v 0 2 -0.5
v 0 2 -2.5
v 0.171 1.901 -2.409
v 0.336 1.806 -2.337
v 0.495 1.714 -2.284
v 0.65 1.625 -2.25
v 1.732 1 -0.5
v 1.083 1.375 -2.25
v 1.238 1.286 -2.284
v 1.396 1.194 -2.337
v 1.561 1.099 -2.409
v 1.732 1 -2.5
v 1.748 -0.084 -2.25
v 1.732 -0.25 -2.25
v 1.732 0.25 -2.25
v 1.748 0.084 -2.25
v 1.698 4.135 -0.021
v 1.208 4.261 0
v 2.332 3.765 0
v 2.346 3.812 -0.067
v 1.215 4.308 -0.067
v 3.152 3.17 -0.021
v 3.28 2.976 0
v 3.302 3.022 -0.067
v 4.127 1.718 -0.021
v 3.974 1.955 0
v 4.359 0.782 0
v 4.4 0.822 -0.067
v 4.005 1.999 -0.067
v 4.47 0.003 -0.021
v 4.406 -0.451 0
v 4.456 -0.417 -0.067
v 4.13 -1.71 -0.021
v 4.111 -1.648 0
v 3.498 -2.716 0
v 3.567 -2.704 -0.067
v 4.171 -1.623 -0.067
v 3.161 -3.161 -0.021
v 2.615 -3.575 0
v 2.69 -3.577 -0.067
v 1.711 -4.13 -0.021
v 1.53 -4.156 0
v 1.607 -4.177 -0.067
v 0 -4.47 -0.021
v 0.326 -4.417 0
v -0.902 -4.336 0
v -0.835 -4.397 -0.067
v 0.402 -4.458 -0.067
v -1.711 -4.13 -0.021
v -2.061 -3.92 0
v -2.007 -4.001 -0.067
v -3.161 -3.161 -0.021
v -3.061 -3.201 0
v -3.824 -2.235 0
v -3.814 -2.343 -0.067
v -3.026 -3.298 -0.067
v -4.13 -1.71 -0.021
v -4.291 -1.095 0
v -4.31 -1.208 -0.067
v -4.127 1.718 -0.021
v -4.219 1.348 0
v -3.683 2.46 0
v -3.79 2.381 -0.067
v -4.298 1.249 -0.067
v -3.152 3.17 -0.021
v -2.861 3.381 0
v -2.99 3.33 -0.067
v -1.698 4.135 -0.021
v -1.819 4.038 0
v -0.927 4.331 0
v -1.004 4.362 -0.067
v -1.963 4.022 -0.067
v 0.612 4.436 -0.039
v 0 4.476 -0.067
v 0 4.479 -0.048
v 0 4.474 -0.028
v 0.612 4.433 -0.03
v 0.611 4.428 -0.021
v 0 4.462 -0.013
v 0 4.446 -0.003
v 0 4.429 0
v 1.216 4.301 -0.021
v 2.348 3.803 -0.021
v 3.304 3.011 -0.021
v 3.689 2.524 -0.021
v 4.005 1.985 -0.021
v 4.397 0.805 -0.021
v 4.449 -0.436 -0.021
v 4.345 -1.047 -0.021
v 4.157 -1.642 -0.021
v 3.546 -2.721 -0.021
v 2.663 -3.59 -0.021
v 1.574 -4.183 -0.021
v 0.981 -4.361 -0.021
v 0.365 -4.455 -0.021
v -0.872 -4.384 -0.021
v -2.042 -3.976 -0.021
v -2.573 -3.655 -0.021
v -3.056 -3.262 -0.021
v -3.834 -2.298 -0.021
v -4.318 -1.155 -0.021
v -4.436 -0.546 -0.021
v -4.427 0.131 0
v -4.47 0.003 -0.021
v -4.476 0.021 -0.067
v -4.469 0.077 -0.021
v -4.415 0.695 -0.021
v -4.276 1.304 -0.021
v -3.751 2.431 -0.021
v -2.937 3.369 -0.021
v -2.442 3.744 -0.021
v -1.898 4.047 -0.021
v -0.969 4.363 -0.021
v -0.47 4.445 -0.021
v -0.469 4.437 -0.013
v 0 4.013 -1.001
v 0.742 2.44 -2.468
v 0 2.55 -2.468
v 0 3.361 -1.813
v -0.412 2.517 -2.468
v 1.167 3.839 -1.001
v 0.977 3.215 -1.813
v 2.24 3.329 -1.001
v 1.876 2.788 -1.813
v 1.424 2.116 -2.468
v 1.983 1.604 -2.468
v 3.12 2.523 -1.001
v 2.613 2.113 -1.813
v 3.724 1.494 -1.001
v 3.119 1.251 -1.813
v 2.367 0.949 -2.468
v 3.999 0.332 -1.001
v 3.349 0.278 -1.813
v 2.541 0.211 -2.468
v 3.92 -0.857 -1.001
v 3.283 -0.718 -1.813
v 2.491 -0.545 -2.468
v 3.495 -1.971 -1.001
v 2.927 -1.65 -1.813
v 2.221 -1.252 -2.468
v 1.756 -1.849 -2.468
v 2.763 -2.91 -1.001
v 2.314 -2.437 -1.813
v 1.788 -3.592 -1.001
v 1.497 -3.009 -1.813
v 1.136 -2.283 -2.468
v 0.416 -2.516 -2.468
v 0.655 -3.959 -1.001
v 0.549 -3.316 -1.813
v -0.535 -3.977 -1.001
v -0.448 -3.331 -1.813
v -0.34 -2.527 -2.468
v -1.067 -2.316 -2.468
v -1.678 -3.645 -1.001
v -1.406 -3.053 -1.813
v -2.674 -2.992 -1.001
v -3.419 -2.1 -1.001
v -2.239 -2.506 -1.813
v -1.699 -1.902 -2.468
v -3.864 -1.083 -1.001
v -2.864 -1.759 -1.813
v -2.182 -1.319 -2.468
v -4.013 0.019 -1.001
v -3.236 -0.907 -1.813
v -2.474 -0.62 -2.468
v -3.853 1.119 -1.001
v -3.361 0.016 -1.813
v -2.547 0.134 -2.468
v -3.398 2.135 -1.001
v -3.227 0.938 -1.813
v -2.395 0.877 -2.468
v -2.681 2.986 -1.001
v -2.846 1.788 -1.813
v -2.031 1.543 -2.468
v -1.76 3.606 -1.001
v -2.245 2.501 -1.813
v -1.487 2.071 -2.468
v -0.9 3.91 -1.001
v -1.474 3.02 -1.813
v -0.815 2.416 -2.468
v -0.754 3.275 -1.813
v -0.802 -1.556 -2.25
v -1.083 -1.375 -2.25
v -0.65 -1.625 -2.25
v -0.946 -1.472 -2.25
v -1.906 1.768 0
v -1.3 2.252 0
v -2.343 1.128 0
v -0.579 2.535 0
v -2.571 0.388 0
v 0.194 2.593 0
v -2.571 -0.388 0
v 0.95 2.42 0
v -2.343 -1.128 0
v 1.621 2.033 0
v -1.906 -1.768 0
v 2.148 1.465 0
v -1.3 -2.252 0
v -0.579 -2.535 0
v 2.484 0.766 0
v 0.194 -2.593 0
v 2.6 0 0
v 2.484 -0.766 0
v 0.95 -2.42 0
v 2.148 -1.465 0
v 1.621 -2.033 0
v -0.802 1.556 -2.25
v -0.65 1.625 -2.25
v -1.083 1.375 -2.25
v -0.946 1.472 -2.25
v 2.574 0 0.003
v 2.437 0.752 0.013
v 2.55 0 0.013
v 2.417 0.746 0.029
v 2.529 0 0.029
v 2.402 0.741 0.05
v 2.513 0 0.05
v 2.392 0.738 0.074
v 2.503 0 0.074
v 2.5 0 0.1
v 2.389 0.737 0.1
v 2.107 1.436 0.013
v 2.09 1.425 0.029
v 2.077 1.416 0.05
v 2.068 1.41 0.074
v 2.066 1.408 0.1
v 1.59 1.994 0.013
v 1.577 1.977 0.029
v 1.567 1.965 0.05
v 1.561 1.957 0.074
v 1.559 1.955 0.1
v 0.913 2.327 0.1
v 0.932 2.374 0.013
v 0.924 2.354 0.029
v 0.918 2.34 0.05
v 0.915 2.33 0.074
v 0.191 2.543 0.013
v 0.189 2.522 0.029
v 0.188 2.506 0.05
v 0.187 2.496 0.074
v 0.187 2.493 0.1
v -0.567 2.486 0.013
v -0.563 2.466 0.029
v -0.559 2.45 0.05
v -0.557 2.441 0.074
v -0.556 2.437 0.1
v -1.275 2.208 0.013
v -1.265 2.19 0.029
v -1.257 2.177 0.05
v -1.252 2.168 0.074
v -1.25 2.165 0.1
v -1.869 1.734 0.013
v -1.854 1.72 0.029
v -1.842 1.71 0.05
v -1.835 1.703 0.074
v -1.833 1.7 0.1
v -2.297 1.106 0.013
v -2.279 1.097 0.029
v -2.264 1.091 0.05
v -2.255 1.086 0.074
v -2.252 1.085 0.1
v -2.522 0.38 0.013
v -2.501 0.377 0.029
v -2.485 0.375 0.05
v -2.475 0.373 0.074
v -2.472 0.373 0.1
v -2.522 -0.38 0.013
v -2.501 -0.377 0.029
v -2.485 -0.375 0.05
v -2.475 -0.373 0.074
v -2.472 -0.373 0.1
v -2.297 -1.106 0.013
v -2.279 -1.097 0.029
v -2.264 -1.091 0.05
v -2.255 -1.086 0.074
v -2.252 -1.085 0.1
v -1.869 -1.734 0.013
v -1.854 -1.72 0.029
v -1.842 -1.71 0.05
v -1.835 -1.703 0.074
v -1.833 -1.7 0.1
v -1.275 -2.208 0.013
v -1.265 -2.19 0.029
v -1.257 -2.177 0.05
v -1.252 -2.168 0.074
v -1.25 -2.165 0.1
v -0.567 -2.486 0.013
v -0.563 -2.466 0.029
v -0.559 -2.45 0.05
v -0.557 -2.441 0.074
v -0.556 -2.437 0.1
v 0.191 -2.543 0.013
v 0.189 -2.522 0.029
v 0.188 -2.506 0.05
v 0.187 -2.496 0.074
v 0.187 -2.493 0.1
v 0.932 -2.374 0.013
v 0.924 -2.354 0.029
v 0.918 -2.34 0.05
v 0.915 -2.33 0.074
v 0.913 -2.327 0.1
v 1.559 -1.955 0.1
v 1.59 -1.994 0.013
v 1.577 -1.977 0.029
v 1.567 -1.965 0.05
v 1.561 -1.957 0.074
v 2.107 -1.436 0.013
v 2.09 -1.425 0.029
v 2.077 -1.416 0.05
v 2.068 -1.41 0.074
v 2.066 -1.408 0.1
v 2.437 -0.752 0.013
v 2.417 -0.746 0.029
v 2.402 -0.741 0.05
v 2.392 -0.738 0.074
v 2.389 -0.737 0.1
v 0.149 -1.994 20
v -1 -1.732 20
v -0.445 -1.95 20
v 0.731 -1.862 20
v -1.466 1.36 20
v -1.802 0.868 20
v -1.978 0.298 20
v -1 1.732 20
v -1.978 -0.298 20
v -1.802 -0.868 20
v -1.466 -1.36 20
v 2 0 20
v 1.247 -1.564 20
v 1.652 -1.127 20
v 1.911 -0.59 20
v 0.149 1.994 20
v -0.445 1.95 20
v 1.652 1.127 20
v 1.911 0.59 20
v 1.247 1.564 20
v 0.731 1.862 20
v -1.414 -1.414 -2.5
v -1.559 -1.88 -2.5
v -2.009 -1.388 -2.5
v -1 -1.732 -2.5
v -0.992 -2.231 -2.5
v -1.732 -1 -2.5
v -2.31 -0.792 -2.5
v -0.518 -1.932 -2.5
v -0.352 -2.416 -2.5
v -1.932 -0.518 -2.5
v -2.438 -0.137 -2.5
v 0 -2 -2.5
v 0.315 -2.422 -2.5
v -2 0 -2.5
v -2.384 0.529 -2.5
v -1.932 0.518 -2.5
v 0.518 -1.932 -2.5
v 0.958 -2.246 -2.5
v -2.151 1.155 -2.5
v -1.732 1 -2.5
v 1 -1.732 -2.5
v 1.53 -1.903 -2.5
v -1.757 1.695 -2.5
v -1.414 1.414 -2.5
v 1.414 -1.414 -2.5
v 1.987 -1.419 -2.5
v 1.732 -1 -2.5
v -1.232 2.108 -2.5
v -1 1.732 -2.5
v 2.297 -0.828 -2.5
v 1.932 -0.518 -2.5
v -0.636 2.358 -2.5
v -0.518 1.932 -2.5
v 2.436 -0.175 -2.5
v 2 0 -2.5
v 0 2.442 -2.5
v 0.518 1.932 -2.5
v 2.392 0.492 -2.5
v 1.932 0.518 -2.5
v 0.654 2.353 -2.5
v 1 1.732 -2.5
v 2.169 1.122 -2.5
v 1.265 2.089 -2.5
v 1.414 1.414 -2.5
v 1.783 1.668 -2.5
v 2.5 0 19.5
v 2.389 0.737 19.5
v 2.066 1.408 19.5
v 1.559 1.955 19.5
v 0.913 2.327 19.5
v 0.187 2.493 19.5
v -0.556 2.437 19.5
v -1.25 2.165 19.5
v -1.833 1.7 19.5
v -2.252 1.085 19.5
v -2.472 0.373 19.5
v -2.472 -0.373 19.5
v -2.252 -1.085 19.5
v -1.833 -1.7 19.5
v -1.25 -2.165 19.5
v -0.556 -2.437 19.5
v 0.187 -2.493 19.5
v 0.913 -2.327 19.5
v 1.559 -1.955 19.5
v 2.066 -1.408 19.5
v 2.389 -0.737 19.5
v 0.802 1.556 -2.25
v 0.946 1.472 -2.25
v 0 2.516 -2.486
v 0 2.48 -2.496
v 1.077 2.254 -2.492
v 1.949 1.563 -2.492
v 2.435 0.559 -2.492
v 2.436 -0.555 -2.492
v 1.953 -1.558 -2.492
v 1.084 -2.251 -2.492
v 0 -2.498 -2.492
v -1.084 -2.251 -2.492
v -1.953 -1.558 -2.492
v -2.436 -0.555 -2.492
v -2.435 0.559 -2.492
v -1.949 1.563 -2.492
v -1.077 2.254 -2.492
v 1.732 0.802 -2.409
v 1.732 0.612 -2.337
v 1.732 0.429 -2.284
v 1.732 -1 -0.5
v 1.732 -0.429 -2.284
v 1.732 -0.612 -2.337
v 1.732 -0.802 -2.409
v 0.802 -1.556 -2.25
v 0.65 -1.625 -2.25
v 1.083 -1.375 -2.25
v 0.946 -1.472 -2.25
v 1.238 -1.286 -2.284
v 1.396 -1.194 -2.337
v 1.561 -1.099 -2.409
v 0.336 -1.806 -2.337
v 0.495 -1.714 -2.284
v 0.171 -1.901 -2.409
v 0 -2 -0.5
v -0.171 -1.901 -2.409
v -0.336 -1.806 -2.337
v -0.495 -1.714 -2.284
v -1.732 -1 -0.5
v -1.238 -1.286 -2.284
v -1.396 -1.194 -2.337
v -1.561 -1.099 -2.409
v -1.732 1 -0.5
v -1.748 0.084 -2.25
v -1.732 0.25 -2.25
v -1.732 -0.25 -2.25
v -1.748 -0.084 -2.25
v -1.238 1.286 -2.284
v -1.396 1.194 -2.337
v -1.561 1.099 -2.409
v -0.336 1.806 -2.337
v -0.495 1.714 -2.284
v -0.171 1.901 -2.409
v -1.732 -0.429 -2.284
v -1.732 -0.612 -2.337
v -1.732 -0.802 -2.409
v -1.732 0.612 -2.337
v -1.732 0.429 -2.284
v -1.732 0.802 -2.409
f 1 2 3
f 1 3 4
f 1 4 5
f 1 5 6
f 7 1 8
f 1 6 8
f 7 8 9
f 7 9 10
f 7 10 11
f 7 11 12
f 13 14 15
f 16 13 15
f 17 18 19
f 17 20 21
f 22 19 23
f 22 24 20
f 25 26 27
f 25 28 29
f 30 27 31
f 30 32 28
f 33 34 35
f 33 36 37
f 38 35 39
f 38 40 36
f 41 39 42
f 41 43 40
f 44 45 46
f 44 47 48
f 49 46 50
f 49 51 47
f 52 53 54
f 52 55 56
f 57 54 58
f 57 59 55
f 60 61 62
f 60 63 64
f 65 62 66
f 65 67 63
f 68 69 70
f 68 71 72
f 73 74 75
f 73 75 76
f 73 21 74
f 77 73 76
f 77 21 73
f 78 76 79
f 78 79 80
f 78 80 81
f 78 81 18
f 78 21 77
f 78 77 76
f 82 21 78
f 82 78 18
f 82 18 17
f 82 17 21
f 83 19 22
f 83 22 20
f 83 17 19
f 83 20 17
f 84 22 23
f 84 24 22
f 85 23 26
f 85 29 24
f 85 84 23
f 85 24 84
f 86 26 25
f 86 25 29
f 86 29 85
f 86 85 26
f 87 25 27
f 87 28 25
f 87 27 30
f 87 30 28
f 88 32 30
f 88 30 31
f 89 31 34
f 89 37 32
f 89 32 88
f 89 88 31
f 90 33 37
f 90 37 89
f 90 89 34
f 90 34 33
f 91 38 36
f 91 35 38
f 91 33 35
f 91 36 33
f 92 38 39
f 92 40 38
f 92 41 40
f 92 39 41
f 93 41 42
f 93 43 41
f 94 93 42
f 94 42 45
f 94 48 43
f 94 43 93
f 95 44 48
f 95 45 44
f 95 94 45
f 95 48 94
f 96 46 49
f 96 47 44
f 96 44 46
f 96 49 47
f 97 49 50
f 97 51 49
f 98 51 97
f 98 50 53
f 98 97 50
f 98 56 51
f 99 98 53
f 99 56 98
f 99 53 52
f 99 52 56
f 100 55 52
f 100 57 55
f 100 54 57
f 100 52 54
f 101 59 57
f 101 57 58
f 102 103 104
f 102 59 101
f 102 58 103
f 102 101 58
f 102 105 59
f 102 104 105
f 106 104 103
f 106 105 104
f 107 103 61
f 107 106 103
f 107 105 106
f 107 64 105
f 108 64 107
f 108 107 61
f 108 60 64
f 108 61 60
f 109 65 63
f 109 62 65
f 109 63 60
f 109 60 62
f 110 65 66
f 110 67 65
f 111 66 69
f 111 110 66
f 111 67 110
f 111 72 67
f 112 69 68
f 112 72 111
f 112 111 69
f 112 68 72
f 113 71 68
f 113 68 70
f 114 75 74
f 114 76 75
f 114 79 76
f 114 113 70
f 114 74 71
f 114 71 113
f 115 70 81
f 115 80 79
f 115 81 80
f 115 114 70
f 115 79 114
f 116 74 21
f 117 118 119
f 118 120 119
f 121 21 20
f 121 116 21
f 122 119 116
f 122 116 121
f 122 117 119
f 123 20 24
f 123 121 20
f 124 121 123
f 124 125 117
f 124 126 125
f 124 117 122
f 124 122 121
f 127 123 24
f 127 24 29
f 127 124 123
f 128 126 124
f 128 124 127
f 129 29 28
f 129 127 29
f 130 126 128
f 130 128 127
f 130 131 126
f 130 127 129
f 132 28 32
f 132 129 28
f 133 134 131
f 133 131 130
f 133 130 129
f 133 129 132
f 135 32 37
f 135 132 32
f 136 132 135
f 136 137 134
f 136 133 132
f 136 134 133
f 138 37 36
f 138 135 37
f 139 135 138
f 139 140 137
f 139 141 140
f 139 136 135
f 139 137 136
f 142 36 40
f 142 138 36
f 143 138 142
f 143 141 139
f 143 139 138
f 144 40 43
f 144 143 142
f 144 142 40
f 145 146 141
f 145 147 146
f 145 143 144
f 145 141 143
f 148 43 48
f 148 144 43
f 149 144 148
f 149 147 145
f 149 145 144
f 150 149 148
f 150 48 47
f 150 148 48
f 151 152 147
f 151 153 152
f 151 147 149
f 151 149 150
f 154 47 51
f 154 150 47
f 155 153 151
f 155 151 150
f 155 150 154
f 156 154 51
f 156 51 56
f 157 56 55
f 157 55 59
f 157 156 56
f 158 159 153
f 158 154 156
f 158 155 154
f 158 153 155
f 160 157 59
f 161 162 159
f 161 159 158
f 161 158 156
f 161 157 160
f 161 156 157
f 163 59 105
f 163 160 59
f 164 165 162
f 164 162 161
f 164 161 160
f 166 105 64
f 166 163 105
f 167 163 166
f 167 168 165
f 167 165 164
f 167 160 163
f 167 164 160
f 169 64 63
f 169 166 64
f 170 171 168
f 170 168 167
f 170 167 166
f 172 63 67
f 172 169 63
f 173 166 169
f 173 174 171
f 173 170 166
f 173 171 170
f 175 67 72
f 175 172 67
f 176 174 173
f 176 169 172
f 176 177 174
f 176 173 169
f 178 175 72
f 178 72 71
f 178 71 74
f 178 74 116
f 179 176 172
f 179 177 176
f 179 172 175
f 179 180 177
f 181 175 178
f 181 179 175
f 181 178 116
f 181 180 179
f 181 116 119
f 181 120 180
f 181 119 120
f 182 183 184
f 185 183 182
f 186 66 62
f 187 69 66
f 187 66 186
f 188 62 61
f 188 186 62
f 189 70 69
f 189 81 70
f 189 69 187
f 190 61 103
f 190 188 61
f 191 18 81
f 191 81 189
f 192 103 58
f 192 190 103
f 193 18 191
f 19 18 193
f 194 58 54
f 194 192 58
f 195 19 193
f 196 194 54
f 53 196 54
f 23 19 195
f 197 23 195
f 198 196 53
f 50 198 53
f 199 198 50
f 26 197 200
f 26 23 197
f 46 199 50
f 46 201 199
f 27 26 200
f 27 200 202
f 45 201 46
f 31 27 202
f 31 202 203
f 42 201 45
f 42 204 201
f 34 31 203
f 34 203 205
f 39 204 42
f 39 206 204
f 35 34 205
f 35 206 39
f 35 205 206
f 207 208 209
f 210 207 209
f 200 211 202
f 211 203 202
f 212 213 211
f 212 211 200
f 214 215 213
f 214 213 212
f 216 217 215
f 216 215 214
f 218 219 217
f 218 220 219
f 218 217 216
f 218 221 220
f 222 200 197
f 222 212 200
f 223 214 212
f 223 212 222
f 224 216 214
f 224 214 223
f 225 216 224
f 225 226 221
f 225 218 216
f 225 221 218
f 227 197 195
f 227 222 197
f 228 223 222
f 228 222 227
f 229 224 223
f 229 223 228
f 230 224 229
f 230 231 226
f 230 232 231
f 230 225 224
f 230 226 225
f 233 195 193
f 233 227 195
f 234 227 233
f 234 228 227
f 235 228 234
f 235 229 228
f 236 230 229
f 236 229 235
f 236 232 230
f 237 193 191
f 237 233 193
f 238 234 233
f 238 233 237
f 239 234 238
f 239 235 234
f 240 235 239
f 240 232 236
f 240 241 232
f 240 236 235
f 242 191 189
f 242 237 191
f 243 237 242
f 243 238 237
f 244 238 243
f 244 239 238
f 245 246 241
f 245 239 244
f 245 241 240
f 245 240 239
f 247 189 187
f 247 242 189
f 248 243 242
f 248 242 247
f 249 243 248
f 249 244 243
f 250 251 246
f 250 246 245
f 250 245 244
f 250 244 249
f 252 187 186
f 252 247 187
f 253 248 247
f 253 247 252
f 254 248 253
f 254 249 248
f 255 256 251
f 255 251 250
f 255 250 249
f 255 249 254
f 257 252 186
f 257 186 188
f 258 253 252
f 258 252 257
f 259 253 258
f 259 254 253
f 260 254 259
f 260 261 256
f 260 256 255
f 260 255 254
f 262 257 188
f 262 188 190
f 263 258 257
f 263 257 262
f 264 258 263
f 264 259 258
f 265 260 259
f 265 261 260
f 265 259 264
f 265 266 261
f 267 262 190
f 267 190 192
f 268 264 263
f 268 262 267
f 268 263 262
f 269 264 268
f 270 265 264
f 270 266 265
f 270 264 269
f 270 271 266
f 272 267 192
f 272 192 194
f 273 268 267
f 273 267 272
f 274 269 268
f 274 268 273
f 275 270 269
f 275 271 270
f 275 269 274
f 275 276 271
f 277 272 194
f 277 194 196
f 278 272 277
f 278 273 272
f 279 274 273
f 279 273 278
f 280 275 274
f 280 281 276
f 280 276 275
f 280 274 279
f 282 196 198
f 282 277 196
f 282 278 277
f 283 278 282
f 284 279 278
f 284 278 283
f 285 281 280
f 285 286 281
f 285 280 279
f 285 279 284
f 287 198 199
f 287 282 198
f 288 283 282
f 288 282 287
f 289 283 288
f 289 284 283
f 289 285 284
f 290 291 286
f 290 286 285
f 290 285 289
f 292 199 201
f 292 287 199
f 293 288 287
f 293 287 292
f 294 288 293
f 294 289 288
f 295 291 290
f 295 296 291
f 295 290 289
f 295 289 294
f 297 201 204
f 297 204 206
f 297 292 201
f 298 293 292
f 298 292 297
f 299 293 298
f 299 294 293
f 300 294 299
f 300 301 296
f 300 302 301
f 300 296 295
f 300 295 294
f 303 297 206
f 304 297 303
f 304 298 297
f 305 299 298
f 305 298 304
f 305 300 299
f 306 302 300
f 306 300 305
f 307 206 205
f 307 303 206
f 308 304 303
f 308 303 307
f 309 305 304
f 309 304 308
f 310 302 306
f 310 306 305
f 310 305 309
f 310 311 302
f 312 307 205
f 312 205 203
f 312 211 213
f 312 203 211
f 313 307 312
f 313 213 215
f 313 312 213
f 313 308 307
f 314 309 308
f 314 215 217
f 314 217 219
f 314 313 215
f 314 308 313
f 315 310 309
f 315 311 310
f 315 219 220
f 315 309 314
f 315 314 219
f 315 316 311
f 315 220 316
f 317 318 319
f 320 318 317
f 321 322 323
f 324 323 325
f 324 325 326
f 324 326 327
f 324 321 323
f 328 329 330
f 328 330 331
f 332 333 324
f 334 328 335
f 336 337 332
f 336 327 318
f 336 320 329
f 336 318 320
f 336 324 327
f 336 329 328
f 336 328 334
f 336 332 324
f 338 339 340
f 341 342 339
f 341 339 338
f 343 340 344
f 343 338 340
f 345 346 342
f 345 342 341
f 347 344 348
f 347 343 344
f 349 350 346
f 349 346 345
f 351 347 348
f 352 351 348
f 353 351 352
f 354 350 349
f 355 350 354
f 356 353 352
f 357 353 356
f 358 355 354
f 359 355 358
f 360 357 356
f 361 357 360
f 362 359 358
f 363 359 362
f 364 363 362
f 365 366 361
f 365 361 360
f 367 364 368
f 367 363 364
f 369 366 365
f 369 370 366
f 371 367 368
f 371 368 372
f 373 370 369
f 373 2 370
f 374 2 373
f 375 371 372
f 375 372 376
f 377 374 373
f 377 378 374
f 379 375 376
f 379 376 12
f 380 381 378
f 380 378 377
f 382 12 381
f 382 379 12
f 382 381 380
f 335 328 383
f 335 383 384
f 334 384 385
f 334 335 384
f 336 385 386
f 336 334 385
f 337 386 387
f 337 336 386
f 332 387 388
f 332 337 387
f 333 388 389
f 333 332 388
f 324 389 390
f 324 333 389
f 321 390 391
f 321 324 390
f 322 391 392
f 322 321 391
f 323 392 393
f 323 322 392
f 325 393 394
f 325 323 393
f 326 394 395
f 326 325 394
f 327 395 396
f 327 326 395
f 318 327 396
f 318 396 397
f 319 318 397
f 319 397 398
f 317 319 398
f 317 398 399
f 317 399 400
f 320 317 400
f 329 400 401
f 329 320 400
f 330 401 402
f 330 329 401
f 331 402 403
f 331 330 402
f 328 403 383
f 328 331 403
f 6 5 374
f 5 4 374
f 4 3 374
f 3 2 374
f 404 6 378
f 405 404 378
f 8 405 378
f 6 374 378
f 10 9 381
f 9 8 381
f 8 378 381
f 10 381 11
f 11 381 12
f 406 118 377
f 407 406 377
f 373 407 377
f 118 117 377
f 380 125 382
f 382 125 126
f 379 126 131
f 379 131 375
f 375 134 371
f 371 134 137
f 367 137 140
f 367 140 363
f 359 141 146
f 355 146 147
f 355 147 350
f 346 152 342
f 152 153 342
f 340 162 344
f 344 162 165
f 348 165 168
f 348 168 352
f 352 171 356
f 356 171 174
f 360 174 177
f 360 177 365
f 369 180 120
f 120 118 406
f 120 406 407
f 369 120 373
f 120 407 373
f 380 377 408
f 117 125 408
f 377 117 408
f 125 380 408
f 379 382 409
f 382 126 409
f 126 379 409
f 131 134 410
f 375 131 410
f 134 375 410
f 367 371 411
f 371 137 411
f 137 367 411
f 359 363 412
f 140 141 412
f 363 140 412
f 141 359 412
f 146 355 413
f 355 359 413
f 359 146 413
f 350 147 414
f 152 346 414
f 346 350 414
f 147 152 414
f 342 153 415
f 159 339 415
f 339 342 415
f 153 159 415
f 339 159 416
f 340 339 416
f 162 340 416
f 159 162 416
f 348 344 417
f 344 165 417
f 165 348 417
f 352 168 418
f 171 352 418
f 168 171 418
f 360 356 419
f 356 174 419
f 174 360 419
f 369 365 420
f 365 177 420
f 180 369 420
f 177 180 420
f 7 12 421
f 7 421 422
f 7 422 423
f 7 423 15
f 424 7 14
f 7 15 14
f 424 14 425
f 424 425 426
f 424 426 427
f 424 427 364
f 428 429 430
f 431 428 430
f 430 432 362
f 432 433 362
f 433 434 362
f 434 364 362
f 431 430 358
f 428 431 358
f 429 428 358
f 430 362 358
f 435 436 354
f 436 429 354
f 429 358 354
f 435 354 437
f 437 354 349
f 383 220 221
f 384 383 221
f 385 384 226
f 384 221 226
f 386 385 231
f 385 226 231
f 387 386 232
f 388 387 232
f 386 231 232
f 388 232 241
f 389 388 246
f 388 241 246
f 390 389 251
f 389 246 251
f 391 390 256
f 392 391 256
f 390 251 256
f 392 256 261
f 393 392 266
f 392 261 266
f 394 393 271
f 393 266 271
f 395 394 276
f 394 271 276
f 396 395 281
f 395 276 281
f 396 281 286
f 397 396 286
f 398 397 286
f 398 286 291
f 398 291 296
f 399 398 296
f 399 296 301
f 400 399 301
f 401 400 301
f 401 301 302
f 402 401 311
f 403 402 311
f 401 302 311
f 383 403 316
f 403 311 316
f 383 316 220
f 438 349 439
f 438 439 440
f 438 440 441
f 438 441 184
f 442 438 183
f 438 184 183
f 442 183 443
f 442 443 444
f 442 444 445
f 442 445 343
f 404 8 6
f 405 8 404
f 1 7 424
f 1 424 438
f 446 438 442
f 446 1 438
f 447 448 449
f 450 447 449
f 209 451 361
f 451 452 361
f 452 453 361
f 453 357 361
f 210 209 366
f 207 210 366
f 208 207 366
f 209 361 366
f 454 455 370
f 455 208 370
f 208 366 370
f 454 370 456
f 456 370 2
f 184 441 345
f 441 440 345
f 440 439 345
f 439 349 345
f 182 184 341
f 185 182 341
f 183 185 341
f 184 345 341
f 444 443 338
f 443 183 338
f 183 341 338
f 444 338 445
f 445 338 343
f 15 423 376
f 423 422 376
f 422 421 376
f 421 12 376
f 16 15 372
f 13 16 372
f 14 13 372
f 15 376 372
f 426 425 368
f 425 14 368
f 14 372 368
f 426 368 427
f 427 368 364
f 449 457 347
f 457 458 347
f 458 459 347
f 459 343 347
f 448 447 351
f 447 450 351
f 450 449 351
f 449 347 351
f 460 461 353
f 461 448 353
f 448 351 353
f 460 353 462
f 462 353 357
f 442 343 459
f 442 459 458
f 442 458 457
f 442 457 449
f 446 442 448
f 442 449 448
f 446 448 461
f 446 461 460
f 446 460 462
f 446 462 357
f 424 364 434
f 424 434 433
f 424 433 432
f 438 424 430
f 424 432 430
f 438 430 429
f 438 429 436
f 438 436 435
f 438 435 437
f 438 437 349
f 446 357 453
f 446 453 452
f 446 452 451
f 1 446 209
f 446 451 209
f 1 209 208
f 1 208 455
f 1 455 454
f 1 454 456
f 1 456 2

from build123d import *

# Parameters (mm, degrees)
SCHIZZO1_R                   = 2.5
ESTRUSIONE_ESTRUSIONE1_DEPTH = 20
TAGLIO_ESTRUSIONE1_DEPTH     = 2
RACCORDO1_R                  = 0.1
SMUSSO1_SIZE                 = 0.5
RACCORDO2_R                  = 0.2
RACCORDO3_R                  = 0.05


with BuildPart() as part:
    # Schizzo1 → Estrusione-Estrusione1 (new body)
    with BuildSketch(Plane.XY):
        Circle(SCHIZZO1_R)
    extrude(amount=ESTRUSIONE_ESTRUSIONE1_DEPTH)

    # Schizzo3 → Rivoluzione1 (revolve)
    with BuildSketch(Plane(origin=(0, 0, 0), x_dir=(0, 0, -1), z_dir=(1, 0, 0))):
        with BuildLine():
            Line((0, 0), (0, 4.5))
            ThreePointArc((0, 4.5), (1.41987242, 3.712340525), (2.5, 2.5))
            Line((2.5, 2.5), (2.5, 0))
            Line((2.5, 0), (0, 0))
        make_face()
    revolve(axis=Axis((0, 0, 0), (0, 0, -1)))

    # Schizzo4 → Taglio-Estrusione1 (cut)
    with BuildSketch(Plane(origin=(0, 0, -2.5), x_dir=(-1, 0, 0), z_dir=(0, 0, -1))):
        Polygon((0, 2), (-1.732050808, 1), (-1.732050808, -1), (0, -2), (1.732050808, -1), (1.732050808, 1), align=None)
    extrude(amount=-TAGLIO_ESTRUSIONE1_DEPTH, mode=Mode.SUBTRACT)

    # Schizzo5 → Taglia-Rivoluzione2 (revolve, cut)
    with BuildSketch(Plane(origin=(0, 0, 0), x_dir=(1, 0, 0), z_dir=(0, 1, 0))):
        Polygon((-2, 2.5), (-2, 2.930277164), (-1.036021703, 2.930277164), (-1.036021703, 2.25), (-1.75, 2.25), align=None)
    revolve(axis=Axis((0, 0, 0), (0, 0, -1)), mode=Mode.SUBTRACT)

    # Raccordo1
    raccordo1_edges = [part.edges().sort_by_distance(p)[0] for p in [
        (-2.5, 0, 0),
    ]]
    fillet(raccordo1_edges, radius=RACCORDO1_R)

    # Smusso1
    smusso1_edges = [part.edges().sort_by_distance(p)[0] for p in [
        (-2.5, 0, 20),
    ]]
    chamfer(smusso1_edges, length=SMUSSO1_SIZE)

    # Raccordo2
    raccordo2_edges = [part.edges().sort_by_distance(p)[0] for p in [
        (0, -2.5, -2.5),
    ]]
    fillet(raccordo2_edges, radius=RACCORDO2_R)

    # Raccordo3
    raccordo3_edges = [part.edges().sort_by_distance(p)[0] for p in [
        (0, -4.5, 0),
    ]]
    fillet(raccordo3_edges, radius=RACCORDO3_R)


solid = part.part
